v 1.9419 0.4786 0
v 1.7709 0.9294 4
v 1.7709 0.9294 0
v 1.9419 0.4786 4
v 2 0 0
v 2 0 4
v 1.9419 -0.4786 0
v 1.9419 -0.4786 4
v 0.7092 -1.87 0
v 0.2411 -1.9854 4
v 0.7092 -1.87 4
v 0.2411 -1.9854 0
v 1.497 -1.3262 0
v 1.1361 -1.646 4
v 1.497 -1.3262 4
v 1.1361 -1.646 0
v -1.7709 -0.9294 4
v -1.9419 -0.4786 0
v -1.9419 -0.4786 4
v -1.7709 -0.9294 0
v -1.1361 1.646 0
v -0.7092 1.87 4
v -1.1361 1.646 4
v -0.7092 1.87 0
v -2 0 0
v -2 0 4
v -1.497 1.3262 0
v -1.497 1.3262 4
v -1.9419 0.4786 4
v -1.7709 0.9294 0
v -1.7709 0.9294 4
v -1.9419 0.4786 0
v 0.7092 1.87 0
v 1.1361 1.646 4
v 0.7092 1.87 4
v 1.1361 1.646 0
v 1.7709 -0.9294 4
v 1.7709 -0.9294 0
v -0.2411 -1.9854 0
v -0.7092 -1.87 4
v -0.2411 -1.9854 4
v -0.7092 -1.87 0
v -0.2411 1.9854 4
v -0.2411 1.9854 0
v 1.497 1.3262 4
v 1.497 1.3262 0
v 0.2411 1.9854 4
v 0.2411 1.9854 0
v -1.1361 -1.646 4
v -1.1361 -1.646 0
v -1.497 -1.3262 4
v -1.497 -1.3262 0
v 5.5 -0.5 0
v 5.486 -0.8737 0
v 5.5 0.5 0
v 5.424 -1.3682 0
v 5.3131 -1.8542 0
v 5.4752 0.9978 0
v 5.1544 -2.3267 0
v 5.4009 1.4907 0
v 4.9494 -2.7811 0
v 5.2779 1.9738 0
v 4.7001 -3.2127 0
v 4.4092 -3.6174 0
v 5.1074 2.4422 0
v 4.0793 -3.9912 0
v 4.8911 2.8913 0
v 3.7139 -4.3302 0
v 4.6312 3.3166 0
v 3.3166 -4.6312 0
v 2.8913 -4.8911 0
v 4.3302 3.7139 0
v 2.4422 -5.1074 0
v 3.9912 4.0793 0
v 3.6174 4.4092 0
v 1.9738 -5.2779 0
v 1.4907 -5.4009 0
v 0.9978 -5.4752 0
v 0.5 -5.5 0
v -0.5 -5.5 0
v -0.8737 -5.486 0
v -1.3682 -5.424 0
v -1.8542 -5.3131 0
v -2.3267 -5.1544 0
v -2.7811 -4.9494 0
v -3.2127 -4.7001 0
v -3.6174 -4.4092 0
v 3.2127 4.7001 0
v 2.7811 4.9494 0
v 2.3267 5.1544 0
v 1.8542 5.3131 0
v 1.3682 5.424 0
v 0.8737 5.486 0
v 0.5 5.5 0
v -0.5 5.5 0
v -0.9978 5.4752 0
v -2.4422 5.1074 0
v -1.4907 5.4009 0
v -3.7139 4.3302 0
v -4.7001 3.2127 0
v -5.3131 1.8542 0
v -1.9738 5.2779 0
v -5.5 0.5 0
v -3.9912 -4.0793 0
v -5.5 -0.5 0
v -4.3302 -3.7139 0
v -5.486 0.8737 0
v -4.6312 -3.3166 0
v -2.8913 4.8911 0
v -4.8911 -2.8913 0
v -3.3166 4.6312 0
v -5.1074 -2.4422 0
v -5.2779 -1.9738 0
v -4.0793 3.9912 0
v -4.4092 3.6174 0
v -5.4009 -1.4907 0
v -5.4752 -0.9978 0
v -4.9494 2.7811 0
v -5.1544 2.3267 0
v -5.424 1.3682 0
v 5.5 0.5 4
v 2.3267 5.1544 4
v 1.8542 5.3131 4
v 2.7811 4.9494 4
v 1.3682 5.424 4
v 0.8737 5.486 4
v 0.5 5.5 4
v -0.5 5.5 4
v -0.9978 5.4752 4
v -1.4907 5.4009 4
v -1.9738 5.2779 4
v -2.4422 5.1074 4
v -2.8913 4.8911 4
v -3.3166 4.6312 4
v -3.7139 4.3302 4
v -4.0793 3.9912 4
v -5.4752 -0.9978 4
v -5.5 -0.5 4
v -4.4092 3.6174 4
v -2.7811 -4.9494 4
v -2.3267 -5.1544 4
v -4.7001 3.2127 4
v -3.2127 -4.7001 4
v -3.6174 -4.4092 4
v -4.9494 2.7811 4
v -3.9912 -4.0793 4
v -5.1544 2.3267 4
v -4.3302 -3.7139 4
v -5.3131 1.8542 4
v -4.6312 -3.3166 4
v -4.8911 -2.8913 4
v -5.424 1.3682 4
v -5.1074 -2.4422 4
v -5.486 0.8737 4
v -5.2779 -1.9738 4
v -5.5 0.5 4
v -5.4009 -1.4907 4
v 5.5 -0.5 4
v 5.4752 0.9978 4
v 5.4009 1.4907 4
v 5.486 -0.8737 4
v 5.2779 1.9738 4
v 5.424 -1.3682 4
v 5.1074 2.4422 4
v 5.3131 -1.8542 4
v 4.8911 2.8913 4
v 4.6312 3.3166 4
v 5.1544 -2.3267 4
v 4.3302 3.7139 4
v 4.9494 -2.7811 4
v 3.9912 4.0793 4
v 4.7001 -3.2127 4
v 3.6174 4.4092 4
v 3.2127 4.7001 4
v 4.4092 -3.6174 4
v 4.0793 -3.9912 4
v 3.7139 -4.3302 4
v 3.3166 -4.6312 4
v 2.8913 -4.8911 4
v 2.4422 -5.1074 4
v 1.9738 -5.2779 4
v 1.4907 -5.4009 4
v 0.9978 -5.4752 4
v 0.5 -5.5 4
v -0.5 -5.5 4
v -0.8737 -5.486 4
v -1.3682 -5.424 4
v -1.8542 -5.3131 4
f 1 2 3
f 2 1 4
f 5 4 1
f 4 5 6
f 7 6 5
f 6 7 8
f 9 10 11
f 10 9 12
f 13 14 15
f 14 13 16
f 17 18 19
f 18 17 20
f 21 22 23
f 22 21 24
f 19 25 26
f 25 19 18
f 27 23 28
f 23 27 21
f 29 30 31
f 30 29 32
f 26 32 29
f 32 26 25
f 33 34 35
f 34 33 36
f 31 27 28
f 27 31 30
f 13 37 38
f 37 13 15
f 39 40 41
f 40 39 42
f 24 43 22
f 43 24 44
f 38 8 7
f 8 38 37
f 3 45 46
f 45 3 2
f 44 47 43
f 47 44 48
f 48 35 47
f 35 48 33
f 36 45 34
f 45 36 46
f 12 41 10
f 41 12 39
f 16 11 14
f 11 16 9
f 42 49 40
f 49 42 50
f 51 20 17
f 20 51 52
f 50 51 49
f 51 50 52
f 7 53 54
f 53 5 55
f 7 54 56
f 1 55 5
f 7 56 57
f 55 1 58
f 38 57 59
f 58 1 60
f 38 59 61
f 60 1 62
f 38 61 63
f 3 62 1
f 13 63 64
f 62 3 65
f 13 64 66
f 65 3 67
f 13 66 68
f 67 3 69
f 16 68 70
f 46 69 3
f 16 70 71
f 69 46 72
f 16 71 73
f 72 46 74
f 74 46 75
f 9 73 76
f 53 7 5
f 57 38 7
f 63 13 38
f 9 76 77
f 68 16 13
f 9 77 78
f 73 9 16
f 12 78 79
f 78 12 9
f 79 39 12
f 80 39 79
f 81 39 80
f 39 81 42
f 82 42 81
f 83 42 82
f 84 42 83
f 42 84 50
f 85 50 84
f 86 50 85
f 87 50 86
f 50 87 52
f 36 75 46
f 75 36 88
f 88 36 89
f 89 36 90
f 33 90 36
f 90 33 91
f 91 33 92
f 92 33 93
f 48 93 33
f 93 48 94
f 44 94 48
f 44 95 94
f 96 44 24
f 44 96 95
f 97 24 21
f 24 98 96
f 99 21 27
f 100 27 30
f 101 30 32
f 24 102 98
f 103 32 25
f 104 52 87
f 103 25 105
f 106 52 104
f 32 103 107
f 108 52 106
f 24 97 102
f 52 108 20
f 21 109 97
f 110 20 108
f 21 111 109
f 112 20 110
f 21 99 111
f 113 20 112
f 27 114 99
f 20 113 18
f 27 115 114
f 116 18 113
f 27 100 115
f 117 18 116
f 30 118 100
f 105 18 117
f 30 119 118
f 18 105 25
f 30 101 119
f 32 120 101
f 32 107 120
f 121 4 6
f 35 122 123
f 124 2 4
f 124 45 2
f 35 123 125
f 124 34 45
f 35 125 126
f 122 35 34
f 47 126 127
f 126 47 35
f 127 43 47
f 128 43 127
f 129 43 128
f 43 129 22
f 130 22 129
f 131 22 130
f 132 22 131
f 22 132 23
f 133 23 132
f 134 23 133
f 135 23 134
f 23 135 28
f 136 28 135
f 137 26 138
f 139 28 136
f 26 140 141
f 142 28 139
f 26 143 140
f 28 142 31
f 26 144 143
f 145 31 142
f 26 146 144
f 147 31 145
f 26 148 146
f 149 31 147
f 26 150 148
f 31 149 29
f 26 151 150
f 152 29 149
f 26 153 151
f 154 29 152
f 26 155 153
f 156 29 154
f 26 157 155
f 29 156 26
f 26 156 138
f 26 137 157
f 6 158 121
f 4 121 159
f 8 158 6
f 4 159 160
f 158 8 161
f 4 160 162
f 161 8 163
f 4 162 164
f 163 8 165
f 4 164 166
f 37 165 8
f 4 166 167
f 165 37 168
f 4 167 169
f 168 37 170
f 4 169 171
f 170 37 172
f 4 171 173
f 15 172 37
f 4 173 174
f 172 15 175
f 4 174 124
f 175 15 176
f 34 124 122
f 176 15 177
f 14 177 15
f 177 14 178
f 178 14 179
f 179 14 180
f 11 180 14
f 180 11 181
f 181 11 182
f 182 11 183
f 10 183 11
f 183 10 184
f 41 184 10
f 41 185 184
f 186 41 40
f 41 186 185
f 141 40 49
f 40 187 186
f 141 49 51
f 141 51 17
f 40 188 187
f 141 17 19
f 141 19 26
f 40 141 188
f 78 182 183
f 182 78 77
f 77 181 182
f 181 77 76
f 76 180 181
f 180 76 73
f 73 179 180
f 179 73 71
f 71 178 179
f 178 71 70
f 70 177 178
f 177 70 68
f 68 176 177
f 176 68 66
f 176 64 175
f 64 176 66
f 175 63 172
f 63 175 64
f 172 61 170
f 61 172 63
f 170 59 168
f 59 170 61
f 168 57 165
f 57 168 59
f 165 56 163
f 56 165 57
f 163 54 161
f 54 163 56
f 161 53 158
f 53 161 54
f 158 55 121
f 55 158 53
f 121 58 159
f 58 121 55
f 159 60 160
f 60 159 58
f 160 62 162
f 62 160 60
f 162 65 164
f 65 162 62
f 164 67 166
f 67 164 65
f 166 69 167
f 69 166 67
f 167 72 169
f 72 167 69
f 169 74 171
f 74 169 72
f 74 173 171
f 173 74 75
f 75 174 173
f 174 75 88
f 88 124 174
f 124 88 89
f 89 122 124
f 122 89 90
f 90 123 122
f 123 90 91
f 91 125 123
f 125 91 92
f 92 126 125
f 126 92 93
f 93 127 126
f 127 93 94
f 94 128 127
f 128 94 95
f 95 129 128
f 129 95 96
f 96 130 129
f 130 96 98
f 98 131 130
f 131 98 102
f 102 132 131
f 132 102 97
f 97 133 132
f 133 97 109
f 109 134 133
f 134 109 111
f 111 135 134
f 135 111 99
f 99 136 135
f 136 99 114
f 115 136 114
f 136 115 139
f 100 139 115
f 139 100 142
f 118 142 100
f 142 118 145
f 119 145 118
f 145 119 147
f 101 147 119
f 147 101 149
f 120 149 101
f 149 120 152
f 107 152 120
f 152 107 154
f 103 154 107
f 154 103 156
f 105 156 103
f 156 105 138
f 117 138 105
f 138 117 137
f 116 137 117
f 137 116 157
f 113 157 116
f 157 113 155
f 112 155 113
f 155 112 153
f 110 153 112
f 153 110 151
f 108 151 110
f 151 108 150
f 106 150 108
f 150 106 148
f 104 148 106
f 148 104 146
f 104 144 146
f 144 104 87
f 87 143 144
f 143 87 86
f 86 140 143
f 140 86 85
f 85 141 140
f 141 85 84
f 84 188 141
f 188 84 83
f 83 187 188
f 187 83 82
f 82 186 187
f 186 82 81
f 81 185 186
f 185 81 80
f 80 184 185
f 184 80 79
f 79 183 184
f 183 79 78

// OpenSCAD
$fa=1/1;
$fs=1/2;
bissl=1/100;

polarizer_x=100;
polarizer_y=50;
inner_offset=3;
outer_offset=1;
lip_width   =4;
hor_wall    =4;
d           =4;

module contact_line(film_x,film_y,lip_width) {
  roof(method="voronoi", convexity=3) difference() {
    offset(r=lip_width) square([film_x,film_y],center=true);
    square([film_x,film_y],center=true);
  }
}
module frame(film_x,film_y,inner_offset,outer_offset,lip_width,thickness,d,upper_feature,lower_feature) {
  difference() {
    union() {
      linear_extrude(height=thickness,convexity=2) difference() {
        offset(r=lip_width+outer_offset)square([film_x,film_y],center=true);
        square([film_x-2*inner_offset,film_y-2*inner_offset],center=true);
      }   
    if(upper_feature)translate([0,0,thickness])contact_line(film_x=film_x,film_y=film_y,lip_width=lip_width);
    }
    if(lower_feature) translate([0,0,-bissl])contact_line(film_x=film_x,film_y=film_y,lip_width=lip_width);
    for (i=[-0.5,0.5]) for (j=[-0.5,0.5]) 
      translate([i*(film_x+lip_width+outer_offset-inner_offset),j*(film_y+lip_width+outer_offset-inner_offset),-bissl])
        cylinder(d=d,h=thickness+lip_width/2+2*bissl);
  }
}
  frame(film_x      =polarizer_x,
        film_y      =polarizer_y,
        inner_offset=inner_offset,
        outer_offset=outer_offset,
        lip_width   =lip_width,
        thickness   =hor_wall,
        d           =d,
        true,true);
